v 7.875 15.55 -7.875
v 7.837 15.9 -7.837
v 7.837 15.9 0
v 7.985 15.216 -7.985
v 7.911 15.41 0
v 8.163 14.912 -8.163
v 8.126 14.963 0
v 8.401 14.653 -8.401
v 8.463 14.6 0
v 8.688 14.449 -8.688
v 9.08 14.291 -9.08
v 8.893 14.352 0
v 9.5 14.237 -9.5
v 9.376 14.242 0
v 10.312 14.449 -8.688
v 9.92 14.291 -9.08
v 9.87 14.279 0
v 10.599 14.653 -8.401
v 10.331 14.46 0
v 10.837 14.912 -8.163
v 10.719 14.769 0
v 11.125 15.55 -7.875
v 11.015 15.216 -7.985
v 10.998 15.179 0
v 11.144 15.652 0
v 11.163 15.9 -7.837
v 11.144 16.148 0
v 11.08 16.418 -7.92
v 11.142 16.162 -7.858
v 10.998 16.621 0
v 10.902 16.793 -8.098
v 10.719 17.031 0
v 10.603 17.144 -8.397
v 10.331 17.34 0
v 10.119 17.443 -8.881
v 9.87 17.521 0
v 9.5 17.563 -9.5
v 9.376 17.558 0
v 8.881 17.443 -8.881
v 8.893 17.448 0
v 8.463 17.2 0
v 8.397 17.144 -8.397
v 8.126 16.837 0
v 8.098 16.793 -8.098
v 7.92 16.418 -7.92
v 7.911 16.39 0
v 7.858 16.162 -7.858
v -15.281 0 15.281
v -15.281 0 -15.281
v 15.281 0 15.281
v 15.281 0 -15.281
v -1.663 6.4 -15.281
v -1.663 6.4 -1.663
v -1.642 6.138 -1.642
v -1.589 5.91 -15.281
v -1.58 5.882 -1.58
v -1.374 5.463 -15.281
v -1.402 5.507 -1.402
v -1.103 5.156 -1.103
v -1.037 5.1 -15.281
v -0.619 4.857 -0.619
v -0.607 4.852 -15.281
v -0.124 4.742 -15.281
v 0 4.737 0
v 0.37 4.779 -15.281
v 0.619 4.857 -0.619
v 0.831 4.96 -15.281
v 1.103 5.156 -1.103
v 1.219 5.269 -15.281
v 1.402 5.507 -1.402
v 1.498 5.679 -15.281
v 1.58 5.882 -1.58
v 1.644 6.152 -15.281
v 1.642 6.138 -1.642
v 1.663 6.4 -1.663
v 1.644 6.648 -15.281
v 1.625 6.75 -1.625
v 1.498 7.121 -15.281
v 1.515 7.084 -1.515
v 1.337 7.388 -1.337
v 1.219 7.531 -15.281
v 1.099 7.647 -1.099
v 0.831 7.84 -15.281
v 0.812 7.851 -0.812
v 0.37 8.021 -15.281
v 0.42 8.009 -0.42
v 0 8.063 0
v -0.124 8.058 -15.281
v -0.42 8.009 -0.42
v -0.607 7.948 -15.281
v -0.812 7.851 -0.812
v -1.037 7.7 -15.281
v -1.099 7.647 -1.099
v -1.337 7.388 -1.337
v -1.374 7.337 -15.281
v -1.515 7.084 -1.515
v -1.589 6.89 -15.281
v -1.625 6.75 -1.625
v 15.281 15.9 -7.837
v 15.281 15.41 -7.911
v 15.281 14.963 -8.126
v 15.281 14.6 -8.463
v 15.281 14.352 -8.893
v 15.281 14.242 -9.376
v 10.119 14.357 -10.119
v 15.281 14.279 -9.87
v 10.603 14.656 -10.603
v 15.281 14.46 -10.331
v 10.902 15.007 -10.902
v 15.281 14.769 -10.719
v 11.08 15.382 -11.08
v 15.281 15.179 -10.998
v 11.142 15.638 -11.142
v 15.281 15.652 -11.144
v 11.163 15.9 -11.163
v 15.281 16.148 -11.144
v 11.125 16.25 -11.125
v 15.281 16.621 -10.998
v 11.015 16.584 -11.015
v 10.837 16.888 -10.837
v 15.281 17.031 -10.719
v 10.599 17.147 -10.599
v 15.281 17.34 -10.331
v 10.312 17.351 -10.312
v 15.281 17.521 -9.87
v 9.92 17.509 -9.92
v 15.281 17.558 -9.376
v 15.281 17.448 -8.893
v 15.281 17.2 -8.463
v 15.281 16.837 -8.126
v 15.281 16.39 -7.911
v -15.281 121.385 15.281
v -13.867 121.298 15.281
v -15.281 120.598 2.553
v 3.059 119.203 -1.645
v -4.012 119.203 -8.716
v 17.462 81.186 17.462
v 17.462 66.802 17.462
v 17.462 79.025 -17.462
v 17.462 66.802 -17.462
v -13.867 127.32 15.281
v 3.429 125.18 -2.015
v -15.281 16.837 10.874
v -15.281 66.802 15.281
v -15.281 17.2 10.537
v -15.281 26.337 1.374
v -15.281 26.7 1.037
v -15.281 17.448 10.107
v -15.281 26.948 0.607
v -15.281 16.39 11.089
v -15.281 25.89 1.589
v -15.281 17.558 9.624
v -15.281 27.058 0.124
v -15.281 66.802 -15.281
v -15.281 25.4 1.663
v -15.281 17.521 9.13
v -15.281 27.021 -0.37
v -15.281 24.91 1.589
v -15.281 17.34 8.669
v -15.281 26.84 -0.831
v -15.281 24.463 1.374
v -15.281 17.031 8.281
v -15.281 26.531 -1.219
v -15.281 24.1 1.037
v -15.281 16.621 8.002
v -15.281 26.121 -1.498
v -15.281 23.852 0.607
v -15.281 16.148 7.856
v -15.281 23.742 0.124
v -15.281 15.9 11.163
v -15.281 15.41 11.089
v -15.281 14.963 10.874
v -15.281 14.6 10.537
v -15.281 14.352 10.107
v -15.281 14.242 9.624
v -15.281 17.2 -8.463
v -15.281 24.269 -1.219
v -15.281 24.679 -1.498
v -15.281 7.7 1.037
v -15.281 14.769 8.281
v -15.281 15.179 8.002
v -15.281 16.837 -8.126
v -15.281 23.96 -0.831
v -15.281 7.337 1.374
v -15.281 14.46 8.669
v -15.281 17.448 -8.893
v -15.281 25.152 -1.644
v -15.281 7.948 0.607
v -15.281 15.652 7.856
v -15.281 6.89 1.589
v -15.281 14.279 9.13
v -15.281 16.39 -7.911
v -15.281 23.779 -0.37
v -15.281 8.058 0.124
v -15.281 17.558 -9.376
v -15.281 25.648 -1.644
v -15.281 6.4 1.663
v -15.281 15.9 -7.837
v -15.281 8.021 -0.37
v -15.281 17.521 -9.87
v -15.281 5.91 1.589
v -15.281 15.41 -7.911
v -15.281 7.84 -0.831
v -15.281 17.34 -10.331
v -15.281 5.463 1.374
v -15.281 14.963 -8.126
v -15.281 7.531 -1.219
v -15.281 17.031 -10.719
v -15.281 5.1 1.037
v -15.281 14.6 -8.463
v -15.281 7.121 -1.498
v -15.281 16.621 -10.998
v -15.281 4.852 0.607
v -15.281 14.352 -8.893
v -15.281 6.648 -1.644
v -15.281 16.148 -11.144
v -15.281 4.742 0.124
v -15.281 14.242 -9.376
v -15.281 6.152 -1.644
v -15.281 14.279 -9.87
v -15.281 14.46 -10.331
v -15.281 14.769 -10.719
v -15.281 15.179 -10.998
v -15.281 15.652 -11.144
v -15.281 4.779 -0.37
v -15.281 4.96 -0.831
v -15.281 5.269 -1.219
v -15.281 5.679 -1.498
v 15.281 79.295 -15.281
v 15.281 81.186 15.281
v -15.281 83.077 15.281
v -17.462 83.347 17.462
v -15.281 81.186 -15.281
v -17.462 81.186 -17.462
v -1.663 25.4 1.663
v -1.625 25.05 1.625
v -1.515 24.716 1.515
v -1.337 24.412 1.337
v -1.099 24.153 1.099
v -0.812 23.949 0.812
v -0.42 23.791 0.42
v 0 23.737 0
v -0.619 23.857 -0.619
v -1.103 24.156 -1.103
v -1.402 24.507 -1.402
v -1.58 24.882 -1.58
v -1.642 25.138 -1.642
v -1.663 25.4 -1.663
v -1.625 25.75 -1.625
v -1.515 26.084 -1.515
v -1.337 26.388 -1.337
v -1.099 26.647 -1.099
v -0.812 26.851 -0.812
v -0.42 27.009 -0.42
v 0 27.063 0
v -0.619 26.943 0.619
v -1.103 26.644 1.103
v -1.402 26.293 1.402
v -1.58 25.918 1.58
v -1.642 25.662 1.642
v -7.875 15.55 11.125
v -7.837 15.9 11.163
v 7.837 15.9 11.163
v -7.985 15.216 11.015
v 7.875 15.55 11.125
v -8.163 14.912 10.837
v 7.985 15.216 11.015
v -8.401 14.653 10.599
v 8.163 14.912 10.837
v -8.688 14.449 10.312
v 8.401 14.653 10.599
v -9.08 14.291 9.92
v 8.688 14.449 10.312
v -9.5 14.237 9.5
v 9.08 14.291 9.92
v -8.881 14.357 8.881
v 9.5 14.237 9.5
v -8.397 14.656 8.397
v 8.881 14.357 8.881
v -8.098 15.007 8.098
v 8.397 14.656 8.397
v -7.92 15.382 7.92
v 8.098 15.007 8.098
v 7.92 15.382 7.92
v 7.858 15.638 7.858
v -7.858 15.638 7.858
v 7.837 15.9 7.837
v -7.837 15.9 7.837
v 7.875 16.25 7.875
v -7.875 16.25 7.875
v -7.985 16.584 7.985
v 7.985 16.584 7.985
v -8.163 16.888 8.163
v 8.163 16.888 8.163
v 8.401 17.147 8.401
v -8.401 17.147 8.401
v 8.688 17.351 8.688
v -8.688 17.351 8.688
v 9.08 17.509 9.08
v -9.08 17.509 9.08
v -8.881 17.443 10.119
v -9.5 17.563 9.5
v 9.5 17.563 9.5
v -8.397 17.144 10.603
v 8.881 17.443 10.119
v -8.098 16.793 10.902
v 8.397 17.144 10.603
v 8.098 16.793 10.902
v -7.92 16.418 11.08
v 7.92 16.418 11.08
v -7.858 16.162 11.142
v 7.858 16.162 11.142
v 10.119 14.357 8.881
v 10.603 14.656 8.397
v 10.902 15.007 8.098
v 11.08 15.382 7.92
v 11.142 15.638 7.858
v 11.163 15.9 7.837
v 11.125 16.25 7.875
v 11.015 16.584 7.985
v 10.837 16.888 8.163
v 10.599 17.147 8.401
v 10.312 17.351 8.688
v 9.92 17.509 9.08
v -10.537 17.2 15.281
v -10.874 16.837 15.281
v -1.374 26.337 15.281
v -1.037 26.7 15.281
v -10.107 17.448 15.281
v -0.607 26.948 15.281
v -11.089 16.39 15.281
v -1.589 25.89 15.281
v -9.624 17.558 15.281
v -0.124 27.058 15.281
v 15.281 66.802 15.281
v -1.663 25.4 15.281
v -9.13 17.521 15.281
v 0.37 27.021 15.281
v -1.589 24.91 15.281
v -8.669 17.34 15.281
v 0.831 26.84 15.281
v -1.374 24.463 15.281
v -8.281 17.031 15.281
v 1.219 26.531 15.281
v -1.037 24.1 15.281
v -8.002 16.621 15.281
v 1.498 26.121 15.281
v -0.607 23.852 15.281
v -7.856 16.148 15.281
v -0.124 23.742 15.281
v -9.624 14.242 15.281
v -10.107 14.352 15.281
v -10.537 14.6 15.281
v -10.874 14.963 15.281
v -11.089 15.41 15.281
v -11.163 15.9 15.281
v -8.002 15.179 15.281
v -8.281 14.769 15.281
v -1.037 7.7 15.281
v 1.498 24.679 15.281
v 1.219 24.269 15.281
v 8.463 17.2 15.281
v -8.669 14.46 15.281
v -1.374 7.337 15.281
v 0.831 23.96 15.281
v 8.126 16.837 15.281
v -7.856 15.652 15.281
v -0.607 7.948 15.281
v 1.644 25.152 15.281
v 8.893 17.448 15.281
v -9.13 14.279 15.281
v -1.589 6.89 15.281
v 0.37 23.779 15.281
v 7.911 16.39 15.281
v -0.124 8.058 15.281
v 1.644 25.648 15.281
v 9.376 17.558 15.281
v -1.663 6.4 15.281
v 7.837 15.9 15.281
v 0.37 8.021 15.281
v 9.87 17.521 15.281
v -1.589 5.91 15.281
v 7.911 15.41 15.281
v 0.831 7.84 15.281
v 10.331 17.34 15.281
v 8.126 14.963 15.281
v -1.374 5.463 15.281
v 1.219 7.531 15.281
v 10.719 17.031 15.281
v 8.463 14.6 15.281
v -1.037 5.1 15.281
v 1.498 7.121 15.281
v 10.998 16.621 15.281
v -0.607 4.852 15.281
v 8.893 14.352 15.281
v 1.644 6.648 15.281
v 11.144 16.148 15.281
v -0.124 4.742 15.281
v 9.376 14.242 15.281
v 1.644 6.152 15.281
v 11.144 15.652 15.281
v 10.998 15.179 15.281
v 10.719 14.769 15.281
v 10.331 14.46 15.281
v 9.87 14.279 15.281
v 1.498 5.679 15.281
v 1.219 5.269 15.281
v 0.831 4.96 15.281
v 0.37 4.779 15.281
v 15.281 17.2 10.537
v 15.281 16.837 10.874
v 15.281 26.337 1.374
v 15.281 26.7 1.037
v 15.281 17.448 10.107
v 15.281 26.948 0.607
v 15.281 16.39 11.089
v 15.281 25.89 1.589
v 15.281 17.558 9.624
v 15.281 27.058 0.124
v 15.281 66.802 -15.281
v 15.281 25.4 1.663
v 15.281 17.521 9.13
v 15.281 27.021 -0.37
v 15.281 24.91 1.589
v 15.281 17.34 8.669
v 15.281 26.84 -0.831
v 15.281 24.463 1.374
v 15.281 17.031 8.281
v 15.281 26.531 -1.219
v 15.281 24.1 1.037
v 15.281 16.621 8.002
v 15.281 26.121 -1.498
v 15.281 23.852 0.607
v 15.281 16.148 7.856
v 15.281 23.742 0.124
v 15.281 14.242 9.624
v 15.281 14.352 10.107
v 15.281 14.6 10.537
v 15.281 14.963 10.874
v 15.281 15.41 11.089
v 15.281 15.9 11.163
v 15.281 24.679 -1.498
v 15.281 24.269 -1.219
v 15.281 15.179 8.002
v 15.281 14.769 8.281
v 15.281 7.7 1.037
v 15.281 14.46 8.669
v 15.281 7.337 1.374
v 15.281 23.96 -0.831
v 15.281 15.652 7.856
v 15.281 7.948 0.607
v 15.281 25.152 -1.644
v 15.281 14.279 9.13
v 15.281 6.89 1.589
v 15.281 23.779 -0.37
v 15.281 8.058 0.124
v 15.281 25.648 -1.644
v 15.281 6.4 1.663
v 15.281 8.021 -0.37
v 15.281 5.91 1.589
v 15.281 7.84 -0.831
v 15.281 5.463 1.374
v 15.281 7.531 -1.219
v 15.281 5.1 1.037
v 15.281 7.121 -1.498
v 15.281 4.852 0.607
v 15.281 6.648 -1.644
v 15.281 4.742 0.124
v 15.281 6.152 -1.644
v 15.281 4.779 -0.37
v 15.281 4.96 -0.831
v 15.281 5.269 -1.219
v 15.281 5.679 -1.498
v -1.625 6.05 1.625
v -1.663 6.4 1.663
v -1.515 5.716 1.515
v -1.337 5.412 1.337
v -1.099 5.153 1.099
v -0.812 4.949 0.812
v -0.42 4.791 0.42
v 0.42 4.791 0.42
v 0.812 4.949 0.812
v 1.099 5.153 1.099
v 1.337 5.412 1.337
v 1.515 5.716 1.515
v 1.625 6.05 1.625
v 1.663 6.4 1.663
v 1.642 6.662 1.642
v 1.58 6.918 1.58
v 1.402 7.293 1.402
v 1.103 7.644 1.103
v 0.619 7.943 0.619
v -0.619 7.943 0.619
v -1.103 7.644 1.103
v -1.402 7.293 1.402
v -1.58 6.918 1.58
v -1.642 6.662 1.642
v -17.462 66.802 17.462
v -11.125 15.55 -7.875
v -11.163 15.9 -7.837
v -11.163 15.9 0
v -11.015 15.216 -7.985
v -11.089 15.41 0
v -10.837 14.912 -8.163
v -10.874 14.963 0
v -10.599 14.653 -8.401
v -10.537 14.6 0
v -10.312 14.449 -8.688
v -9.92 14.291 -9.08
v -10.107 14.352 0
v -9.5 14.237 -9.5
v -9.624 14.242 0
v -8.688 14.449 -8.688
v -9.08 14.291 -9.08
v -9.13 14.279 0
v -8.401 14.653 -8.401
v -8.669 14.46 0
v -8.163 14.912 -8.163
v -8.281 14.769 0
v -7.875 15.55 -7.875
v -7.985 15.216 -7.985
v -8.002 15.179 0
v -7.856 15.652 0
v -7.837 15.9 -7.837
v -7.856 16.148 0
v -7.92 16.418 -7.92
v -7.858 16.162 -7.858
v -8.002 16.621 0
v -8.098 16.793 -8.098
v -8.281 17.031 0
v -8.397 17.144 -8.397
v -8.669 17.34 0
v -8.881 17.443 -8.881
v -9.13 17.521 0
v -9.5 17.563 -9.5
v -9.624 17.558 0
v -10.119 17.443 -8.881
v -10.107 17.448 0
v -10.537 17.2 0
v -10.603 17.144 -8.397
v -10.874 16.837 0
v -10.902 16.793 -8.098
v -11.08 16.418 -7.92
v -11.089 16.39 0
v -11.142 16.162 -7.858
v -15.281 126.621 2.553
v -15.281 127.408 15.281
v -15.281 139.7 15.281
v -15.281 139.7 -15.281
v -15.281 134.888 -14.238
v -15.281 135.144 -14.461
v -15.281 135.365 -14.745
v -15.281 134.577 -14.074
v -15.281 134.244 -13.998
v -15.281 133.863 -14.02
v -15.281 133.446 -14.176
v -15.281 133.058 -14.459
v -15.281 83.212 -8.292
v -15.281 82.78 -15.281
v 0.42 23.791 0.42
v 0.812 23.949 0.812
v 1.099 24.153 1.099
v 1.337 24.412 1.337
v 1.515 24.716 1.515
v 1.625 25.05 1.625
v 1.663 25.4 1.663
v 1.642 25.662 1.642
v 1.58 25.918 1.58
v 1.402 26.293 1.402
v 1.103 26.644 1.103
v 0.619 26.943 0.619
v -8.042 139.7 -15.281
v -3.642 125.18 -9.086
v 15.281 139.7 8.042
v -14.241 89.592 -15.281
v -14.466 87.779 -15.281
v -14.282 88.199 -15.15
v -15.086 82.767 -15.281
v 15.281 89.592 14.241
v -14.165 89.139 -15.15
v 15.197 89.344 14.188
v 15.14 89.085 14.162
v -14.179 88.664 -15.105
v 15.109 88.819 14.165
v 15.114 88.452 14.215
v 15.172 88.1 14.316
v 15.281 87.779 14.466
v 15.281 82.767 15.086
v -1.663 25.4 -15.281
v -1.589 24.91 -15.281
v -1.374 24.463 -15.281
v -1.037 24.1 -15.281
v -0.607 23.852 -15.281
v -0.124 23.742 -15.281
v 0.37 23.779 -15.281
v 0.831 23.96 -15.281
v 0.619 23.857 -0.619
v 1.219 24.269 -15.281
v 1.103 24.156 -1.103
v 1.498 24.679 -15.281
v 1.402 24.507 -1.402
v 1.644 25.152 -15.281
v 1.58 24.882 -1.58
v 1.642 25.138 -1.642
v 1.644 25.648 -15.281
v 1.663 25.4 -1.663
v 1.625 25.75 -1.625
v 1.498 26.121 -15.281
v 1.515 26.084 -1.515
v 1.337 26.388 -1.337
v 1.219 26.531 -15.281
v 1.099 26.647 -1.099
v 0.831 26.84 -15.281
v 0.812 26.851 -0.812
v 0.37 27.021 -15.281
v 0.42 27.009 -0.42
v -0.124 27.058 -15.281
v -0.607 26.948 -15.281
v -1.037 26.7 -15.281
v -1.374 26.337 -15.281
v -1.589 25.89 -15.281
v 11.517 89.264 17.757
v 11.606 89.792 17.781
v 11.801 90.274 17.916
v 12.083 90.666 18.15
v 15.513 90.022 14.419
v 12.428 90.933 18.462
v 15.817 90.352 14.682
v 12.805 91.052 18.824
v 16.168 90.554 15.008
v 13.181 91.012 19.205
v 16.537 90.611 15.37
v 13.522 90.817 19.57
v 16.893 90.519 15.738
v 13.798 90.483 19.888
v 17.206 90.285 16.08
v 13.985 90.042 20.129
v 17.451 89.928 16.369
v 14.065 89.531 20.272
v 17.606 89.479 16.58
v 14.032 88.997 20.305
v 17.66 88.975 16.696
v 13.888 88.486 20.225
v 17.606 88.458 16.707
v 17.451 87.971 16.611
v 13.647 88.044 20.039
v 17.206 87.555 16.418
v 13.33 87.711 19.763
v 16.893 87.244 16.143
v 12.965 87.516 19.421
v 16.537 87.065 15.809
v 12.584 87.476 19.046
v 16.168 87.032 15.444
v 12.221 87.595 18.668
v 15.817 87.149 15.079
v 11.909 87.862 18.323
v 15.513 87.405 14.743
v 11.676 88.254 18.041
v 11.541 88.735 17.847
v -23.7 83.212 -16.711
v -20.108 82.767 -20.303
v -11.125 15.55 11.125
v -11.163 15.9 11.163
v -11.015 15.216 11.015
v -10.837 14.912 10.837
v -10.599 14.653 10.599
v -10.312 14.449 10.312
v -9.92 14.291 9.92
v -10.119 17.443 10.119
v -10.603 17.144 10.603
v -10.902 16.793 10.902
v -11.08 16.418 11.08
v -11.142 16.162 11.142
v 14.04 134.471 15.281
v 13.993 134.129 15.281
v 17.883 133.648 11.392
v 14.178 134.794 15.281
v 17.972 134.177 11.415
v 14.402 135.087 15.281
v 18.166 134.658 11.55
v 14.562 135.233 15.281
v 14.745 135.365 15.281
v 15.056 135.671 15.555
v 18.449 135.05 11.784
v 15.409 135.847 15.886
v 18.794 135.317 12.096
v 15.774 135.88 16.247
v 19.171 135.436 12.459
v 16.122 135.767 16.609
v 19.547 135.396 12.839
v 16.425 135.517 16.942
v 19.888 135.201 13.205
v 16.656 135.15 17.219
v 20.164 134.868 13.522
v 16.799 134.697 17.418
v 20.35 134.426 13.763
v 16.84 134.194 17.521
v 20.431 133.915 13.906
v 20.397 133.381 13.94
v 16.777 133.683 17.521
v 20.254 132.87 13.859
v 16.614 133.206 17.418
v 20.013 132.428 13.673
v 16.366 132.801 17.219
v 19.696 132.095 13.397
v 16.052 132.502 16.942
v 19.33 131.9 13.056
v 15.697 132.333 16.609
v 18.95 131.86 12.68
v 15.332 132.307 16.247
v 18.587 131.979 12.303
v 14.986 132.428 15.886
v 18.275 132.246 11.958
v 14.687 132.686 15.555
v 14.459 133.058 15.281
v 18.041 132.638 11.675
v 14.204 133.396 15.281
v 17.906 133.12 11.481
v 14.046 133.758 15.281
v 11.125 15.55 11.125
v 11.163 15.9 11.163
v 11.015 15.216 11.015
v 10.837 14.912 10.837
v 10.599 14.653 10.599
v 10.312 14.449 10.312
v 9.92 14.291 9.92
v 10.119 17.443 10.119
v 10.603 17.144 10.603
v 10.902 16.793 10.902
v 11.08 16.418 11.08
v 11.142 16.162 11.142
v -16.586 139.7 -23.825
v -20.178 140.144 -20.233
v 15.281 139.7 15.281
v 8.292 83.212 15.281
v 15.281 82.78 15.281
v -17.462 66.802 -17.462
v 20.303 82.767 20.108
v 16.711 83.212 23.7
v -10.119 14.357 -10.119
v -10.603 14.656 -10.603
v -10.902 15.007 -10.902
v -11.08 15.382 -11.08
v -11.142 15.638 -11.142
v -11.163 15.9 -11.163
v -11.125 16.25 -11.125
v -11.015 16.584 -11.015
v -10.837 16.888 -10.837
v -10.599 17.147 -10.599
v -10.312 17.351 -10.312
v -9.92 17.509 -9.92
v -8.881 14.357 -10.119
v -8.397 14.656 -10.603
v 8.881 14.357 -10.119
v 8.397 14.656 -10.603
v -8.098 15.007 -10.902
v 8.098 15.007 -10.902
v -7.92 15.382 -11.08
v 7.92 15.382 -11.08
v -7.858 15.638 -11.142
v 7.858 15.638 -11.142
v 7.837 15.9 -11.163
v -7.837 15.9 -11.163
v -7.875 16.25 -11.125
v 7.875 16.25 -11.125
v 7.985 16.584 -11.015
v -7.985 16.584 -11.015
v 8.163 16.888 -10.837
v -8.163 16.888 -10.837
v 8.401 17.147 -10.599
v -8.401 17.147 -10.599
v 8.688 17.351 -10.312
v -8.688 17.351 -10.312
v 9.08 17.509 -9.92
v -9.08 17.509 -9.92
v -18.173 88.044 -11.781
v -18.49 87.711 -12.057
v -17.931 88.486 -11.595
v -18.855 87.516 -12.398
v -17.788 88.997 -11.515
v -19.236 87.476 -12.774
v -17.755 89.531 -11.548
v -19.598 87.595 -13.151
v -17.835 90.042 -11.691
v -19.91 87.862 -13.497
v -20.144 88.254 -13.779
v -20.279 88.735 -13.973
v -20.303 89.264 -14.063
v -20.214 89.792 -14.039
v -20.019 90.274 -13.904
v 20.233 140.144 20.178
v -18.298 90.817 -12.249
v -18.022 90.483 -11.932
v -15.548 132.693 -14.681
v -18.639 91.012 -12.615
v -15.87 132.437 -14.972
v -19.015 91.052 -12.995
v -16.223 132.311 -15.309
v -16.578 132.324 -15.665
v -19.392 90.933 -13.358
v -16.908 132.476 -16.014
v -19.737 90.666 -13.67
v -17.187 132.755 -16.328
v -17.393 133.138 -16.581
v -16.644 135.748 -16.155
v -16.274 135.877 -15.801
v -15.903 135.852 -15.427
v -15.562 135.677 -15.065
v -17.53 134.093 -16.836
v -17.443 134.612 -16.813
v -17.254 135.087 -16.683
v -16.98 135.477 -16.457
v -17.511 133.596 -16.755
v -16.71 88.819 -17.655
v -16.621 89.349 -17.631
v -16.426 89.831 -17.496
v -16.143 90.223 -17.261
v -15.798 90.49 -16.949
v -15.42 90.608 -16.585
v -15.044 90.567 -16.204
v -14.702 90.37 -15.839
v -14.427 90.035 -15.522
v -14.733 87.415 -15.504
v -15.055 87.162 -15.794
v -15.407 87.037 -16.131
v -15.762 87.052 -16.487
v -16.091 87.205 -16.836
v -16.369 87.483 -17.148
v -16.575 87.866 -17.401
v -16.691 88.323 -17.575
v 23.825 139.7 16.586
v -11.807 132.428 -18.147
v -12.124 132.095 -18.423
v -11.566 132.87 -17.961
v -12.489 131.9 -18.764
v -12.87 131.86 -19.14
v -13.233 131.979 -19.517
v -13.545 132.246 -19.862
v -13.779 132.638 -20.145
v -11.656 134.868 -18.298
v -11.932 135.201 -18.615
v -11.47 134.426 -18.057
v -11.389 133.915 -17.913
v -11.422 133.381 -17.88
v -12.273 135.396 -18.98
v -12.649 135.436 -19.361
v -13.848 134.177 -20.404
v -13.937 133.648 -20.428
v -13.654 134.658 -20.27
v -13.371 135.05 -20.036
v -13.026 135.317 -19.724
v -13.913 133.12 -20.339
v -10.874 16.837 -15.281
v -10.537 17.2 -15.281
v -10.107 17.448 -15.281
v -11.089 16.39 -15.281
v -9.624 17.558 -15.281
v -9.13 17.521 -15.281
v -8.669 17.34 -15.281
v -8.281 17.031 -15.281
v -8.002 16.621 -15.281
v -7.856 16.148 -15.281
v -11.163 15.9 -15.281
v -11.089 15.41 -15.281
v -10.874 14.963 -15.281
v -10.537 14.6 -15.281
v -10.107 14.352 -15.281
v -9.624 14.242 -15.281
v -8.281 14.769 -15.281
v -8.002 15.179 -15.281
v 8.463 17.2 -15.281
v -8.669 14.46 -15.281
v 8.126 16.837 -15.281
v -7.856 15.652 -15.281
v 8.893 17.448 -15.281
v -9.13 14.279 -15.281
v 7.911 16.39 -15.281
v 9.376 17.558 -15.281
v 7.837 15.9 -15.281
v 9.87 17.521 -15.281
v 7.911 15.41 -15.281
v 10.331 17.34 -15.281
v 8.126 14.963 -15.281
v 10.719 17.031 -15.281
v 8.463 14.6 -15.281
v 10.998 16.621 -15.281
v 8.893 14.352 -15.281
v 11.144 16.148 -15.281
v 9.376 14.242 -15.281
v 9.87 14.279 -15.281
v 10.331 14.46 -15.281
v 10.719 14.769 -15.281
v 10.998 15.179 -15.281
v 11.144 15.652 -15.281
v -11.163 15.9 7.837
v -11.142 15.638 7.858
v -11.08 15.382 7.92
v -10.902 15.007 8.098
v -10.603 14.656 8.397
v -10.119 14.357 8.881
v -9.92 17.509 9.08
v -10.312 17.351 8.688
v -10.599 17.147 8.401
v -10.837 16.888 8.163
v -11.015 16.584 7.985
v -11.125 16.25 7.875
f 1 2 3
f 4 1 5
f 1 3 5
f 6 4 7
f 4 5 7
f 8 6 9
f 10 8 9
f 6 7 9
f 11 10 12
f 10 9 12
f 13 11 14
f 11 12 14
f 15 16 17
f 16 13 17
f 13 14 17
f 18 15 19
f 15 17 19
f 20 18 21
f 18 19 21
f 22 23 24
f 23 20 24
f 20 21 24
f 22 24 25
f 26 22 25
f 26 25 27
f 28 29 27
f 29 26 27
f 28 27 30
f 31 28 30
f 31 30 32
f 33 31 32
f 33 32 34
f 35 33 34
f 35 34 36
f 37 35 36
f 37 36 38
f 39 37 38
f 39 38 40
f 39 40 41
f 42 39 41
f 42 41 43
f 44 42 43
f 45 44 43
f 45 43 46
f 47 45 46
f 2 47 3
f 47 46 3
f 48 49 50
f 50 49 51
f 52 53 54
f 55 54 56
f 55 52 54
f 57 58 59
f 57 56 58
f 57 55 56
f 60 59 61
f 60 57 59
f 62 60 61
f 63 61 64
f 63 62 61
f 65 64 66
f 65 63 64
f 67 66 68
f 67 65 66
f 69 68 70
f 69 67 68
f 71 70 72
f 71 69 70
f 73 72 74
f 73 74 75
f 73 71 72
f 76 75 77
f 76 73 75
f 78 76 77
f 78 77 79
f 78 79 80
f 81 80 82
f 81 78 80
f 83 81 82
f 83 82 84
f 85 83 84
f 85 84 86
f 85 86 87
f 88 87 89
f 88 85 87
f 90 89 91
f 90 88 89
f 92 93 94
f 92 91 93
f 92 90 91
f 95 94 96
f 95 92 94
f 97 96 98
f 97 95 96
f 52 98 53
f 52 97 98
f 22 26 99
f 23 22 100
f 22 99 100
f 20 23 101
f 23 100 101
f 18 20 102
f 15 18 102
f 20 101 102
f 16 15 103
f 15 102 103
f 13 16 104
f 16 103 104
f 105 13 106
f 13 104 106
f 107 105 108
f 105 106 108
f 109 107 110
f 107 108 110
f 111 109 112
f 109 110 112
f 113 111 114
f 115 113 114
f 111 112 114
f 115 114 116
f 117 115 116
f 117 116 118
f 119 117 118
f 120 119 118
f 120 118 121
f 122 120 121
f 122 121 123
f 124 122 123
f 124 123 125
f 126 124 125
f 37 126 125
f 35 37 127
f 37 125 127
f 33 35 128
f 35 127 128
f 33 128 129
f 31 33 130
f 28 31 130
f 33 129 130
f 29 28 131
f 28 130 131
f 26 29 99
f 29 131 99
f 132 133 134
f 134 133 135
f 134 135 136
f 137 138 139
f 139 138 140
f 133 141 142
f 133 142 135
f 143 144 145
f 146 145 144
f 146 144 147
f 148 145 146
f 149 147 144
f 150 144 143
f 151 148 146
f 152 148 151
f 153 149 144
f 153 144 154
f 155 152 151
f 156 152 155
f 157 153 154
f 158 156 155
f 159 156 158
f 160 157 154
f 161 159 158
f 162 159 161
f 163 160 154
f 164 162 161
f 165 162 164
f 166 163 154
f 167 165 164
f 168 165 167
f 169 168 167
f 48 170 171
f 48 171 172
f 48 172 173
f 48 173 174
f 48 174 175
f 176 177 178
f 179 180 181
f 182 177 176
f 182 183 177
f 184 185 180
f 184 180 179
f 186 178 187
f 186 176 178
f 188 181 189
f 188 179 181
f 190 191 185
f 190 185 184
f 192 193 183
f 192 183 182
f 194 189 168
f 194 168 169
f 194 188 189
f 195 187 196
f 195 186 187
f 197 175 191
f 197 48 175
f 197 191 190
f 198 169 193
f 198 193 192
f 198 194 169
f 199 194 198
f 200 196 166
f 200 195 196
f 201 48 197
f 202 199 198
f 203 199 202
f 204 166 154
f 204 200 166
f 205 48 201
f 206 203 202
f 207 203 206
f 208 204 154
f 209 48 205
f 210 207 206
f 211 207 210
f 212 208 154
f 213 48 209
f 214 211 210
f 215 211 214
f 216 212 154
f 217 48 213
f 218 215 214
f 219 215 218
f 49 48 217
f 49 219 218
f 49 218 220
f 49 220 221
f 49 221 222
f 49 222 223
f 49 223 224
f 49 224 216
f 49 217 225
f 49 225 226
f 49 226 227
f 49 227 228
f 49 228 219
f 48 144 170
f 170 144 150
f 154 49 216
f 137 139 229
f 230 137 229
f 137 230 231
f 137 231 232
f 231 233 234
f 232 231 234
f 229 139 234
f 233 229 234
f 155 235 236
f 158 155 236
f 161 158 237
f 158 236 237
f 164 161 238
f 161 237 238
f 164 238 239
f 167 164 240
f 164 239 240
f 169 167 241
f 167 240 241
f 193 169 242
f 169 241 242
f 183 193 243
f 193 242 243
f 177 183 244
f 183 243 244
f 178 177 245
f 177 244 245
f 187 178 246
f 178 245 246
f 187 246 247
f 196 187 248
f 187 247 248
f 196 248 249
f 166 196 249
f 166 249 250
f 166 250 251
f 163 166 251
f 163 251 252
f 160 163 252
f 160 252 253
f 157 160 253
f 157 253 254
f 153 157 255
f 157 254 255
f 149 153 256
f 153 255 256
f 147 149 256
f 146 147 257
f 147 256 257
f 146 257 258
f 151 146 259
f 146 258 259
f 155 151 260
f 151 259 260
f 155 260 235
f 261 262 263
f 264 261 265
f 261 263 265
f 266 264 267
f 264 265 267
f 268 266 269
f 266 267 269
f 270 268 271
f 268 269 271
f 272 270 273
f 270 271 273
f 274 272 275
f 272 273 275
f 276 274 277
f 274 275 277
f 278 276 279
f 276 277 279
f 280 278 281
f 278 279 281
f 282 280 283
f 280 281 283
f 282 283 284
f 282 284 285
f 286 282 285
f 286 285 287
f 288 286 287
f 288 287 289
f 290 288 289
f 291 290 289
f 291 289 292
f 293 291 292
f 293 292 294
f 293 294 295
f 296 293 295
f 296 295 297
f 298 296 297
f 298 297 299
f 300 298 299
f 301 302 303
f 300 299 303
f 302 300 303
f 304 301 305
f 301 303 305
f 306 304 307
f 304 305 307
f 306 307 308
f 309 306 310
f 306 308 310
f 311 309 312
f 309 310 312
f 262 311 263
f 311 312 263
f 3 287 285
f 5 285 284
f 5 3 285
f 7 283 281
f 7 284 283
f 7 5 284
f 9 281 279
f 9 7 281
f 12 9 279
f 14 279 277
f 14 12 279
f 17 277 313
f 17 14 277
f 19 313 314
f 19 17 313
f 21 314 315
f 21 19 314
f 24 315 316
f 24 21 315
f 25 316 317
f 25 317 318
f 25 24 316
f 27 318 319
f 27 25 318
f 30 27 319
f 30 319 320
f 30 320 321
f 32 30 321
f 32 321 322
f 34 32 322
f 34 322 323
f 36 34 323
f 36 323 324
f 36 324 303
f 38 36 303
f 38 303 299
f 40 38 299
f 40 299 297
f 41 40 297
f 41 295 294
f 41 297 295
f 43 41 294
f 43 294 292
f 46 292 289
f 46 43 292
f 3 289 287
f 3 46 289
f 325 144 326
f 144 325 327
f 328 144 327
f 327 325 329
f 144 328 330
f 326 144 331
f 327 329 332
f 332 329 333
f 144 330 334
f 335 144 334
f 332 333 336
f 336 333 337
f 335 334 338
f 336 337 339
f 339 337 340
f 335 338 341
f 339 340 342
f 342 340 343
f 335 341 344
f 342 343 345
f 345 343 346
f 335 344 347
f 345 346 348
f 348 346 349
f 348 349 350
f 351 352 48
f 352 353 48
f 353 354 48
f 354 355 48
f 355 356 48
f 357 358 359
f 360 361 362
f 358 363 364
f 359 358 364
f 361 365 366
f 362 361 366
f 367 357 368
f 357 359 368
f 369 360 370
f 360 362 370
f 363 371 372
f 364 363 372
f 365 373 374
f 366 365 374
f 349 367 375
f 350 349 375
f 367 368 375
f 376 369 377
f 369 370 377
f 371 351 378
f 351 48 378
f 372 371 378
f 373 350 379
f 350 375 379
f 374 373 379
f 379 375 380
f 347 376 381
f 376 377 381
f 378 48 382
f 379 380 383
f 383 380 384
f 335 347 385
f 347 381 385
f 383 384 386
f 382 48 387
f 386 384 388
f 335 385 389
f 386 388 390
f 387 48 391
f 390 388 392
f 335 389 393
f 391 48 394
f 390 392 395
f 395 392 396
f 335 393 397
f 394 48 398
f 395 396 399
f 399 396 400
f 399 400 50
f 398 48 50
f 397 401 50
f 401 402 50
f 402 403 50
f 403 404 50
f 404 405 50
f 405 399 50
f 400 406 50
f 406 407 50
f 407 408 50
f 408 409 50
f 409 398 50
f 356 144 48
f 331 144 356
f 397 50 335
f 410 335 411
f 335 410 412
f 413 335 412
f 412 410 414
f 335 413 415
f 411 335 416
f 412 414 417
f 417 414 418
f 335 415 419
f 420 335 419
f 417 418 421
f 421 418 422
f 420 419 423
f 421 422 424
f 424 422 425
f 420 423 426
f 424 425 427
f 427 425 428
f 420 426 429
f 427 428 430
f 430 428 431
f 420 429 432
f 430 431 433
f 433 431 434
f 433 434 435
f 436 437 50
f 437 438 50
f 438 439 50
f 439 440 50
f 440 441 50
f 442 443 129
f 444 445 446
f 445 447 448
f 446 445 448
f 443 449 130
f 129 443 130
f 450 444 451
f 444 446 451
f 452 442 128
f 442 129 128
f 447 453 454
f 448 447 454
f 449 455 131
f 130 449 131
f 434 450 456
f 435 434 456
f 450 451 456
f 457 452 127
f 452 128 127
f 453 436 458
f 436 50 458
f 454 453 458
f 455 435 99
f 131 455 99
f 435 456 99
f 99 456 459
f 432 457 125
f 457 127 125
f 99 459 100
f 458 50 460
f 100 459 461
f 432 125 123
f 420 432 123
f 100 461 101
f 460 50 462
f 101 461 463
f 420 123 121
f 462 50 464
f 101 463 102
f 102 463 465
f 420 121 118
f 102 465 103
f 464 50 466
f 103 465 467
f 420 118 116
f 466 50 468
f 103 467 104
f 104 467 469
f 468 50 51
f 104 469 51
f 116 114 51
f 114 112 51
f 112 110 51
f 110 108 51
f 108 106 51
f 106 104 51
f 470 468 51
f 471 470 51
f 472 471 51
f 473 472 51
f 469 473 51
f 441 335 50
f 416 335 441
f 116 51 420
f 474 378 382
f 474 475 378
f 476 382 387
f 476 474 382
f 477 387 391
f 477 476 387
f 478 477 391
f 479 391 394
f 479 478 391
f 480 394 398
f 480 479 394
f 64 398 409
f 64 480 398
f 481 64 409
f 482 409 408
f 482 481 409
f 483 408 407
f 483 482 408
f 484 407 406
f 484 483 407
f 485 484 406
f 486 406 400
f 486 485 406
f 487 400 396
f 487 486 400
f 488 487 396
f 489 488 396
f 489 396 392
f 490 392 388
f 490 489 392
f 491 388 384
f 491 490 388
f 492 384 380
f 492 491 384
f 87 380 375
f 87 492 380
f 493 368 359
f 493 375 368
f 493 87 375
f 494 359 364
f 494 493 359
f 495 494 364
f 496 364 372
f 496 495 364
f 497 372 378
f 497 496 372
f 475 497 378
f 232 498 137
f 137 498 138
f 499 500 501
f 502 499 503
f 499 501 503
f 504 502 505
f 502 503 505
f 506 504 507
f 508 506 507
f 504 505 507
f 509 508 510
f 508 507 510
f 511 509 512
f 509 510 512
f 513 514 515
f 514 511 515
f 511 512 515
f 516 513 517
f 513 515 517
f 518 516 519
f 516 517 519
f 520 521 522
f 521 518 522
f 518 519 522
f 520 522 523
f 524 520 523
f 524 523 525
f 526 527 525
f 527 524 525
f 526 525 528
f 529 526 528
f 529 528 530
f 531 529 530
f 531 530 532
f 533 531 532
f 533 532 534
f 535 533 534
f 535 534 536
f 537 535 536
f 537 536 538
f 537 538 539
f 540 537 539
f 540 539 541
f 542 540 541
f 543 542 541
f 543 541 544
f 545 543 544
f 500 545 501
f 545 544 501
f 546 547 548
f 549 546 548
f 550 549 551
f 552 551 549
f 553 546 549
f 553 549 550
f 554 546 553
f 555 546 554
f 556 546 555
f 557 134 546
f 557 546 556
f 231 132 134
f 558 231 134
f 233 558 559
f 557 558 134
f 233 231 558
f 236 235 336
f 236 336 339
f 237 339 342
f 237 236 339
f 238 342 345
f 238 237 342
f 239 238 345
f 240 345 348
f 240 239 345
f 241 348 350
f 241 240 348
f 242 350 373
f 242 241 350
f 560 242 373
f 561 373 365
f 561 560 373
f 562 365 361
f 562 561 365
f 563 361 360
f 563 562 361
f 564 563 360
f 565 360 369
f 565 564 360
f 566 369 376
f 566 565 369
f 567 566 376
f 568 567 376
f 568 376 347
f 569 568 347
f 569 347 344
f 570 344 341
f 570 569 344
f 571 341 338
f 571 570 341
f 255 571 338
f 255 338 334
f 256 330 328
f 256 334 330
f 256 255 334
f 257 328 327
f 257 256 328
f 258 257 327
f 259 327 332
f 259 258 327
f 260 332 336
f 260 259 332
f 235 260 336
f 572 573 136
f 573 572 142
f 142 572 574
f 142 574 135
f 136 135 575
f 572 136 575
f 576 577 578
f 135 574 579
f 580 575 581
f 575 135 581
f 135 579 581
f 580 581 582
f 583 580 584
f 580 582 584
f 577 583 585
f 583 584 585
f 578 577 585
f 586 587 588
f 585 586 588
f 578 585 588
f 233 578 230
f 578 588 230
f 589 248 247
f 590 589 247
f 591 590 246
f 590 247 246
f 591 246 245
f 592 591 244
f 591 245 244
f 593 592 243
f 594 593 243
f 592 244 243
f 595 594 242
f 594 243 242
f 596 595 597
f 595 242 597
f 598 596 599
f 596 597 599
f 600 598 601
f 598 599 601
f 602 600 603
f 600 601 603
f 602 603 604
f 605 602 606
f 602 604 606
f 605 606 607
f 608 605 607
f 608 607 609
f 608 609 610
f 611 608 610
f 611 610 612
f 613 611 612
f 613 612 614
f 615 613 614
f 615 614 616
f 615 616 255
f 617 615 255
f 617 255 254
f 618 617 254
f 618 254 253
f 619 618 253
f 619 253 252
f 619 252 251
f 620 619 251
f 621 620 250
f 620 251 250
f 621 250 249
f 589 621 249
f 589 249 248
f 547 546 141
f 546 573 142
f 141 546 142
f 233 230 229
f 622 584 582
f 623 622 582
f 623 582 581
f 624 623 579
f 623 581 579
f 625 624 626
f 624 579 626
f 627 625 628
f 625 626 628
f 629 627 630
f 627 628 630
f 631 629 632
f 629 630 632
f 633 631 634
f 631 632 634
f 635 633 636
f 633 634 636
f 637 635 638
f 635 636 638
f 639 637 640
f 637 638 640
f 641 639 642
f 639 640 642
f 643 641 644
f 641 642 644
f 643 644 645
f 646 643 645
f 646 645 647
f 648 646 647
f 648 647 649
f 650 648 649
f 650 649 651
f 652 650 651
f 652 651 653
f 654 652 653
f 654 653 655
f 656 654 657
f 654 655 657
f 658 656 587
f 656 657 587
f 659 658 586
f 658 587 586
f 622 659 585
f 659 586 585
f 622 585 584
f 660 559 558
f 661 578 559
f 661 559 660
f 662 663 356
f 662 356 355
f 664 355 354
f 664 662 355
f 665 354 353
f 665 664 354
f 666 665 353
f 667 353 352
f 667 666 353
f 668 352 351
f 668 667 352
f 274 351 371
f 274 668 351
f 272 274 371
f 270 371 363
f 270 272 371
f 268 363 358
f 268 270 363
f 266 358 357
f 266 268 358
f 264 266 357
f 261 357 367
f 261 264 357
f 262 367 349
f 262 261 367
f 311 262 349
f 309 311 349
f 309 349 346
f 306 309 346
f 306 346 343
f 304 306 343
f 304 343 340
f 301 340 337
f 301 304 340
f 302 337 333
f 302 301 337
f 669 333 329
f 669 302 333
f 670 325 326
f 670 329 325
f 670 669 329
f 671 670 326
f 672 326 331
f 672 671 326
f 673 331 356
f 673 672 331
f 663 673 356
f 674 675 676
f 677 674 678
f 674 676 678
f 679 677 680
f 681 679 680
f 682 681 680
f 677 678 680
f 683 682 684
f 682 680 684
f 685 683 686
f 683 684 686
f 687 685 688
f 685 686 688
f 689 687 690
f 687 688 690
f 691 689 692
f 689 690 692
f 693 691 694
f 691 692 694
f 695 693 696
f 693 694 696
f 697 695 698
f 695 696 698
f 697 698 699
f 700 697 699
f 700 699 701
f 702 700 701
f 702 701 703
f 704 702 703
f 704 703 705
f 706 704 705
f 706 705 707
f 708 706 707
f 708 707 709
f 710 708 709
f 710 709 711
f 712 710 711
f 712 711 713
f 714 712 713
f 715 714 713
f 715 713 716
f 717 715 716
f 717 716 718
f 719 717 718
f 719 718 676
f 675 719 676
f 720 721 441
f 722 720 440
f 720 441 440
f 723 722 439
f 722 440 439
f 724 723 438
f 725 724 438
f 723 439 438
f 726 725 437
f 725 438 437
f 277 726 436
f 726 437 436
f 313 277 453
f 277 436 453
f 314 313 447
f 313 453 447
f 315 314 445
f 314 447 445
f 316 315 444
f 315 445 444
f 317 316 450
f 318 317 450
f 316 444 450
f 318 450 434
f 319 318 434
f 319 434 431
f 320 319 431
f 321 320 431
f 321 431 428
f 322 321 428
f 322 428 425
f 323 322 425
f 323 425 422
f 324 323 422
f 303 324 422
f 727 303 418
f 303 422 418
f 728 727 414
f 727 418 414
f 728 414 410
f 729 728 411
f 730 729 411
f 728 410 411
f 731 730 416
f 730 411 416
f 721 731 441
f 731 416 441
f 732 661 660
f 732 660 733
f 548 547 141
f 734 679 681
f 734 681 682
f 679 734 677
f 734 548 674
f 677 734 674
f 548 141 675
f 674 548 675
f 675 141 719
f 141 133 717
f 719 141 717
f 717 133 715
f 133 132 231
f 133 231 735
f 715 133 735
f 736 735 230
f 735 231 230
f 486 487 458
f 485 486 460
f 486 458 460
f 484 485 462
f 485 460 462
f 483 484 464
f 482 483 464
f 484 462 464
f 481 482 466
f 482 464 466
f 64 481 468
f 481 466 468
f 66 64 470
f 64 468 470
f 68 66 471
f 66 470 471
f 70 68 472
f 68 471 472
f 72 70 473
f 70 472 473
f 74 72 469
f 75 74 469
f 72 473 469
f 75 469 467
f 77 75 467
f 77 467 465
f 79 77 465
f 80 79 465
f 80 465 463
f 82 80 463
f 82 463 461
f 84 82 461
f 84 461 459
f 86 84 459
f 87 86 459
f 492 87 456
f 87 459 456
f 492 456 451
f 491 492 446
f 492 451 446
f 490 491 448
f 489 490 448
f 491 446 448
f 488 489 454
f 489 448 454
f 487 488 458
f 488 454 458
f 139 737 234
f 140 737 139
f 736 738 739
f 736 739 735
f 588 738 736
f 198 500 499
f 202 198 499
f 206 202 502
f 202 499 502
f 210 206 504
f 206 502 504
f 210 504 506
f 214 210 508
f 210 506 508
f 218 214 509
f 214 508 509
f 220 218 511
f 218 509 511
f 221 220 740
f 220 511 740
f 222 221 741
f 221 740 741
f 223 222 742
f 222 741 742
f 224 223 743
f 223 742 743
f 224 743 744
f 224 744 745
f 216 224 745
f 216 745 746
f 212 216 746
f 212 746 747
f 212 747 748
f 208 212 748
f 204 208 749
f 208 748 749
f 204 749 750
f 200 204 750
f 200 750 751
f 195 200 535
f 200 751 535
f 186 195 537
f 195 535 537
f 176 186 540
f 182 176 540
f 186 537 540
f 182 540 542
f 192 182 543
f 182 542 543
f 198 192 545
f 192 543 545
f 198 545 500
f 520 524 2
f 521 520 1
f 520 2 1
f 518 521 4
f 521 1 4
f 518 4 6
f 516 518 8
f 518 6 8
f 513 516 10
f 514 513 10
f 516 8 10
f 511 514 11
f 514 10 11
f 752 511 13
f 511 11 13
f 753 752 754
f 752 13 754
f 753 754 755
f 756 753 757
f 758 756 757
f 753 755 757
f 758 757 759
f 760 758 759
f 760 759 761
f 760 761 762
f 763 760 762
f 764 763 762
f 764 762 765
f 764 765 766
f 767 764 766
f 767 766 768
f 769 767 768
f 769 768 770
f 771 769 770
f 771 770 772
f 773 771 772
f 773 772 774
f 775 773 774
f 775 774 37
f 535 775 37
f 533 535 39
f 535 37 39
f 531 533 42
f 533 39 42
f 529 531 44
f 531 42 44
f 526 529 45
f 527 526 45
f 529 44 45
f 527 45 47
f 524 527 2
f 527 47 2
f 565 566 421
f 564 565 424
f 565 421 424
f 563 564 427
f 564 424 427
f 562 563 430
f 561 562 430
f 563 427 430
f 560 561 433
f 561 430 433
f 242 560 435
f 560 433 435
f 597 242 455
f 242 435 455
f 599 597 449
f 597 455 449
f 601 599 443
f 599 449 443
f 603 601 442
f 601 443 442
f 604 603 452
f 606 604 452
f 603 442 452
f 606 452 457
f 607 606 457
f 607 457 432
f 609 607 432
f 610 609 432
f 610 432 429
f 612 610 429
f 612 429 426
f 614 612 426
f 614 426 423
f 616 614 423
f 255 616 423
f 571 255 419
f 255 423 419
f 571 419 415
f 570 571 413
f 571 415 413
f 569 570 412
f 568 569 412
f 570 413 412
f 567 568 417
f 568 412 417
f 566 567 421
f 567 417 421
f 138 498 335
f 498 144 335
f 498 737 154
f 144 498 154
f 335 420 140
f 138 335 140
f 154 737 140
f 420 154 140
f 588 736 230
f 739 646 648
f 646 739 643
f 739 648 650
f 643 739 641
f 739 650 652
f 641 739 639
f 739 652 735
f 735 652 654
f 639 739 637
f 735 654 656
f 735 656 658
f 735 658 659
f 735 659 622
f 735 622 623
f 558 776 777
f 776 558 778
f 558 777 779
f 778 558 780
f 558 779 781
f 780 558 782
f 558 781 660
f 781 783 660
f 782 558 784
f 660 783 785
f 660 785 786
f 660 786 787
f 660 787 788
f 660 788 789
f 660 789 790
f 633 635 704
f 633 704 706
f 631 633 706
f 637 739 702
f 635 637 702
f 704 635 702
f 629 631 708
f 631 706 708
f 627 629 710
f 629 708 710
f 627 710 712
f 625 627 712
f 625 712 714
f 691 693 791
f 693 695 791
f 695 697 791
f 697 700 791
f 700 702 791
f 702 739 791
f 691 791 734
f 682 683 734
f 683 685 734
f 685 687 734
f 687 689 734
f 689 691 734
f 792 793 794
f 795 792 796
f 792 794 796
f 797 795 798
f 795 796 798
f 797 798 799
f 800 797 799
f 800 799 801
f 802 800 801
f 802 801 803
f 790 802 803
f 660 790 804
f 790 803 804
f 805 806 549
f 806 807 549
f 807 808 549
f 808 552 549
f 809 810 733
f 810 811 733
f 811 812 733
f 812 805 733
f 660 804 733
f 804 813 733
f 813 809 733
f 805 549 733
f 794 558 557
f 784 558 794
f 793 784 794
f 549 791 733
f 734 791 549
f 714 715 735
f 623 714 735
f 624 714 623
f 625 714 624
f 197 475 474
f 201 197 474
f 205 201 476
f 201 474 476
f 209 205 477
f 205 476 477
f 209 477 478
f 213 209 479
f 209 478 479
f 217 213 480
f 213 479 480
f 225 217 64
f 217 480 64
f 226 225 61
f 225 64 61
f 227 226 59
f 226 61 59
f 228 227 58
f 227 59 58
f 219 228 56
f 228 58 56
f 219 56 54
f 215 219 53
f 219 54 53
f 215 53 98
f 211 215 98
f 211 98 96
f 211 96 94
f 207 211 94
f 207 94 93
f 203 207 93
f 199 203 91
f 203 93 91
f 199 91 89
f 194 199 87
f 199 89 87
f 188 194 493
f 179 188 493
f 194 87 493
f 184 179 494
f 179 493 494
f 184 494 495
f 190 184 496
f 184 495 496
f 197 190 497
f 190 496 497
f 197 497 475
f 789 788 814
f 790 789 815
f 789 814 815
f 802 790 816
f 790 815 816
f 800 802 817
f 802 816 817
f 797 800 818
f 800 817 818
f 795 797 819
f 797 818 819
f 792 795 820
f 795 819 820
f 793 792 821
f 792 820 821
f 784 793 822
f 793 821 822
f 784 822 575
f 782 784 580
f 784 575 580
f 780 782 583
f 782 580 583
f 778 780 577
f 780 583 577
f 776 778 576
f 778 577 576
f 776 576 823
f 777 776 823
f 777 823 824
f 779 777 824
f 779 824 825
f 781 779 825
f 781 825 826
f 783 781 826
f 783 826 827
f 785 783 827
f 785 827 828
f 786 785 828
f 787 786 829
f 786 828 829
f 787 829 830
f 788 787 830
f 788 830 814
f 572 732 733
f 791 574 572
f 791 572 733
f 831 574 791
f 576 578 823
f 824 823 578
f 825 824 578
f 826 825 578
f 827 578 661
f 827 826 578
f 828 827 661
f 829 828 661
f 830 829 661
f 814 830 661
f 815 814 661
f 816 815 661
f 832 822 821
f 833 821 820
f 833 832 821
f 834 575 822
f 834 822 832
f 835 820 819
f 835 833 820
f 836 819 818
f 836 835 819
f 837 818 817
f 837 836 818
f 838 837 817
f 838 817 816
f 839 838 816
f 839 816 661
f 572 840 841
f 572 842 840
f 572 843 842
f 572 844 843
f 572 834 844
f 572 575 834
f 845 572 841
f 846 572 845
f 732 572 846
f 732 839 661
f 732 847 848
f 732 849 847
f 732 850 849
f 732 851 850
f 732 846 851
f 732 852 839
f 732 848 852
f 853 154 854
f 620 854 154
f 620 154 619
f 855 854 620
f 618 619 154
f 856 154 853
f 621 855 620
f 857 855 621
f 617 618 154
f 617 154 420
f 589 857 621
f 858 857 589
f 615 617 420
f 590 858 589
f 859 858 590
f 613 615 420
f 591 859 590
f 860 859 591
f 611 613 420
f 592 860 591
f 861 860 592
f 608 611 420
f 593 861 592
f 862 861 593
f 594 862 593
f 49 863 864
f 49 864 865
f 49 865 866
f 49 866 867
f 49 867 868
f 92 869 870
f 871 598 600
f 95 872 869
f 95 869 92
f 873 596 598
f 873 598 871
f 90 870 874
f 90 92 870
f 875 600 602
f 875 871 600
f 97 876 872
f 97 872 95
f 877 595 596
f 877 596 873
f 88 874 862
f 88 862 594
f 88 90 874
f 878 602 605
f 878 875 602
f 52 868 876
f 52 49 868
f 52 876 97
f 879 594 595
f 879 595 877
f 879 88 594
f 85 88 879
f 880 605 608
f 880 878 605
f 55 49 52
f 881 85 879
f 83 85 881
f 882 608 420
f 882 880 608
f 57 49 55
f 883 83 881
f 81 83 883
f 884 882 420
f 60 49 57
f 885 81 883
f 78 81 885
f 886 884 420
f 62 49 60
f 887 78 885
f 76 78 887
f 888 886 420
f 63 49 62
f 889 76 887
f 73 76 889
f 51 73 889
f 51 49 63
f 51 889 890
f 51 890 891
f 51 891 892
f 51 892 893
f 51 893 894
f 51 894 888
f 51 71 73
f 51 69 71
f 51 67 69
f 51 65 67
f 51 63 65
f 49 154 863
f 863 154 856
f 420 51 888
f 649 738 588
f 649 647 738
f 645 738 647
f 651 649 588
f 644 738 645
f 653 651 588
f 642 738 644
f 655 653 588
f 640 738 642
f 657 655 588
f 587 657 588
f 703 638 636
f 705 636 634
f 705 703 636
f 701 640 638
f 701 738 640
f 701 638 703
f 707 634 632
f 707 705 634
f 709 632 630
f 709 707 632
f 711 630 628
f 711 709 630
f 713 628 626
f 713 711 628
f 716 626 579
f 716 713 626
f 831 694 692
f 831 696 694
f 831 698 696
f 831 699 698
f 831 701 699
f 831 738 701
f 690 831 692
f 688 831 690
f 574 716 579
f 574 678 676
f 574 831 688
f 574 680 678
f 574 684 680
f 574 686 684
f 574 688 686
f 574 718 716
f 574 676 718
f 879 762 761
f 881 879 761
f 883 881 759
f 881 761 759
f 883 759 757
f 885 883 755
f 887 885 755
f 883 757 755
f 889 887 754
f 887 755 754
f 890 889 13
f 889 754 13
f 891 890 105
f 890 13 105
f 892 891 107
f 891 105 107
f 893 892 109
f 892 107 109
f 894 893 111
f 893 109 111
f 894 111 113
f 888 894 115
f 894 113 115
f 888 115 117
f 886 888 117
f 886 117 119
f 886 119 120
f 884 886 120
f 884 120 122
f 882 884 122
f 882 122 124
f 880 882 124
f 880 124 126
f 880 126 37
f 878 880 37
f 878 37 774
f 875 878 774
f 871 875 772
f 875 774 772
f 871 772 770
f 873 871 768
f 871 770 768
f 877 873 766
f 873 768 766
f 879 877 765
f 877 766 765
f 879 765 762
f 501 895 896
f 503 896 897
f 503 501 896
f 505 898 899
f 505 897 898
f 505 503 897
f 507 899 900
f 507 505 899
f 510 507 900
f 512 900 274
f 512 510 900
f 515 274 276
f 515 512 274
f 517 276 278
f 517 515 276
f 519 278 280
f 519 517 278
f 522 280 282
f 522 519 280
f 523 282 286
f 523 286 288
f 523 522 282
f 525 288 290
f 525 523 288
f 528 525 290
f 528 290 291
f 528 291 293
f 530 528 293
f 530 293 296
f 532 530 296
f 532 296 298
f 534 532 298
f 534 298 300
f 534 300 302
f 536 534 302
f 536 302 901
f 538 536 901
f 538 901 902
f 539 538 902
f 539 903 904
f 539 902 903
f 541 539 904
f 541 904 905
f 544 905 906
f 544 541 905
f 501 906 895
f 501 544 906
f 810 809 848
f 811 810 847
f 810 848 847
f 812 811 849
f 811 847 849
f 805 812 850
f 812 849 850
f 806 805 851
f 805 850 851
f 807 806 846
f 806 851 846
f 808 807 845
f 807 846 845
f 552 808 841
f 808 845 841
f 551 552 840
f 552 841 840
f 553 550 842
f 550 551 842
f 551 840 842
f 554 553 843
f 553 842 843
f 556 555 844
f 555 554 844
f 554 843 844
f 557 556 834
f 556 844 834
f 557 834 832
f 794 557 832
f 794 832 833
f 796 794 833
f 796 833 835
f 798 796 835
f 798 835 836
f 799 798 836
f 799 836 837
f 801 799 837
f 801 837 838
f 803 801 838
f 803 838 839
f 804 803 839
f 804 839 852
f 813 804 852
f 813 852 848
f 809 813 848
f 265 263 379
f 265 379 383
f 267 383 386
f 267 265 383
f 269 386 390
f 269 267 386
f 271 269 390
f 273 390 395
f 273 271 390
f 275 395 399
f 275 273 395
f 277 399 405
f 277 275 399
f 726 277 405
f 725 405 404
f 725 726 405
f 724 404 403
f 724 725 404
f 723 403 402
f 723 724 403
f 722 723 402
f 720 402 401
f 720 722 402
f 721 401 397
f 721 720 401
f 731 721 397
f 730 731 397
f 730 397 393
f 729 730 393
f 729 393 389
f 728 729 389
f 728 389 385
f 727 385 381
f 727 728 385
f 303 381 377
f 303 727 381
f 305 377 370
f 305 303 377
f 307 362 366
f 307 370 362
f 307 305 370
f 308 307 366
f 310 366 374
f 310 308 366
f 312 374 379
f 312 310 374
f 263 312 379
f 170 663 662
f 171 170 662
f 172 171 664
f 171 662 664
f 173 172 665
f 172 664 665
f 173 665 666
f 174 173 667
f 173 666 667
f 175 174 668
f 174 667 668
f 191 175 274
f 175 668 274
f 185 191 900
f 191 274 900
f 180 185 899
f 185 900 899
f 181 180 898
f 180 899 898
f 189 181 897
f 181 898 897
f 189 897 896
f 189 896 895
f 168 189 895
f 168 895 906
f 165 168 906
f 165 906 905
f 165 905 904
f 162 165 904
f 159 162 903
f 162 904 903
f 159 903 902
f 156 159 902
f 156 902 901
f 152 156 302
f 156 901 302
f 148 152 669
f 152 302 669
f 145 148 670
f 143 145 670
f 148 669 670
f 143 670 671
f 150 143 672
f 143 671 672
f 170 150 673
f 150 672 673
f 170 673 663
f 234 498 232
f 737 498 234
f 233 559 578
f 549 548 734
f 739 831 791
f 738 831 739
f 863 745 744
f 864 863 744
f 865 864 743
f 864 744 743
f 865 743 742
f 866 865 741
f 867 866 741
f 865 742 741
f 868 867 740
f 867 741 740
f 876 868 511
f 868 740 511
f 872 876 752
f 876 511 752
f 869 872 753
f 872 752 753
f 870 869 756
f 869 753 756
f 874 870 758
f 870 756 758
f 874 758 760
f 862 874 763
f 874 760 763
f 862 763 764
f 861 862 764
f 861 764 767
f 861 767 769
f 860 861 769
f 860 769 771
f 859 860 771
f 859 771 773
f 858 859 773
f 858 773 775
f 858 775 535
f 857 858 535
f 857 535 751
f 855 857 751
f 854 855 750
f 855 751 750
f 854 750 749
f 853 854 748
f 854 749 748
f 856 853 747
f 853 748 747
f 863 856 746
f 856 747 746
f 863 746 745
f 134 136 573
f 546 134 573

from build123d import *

# Parameters (mm, degrees)
SKETCH1_W               = 30.562599784
SKETCH1_H               = 30.562599784
BOSS_EXTRUDE1_DEPTH     = 139.7
CUT_EXTRUDE1_DEPTH      = 142.361685943
CUT_EXTRUDE1_DEPTH_BACK = 142.361685943
BOSS_EXTRUDE2_DEPTH     = 5.09983
SKETCH5_R               = 1.8
CUT_EXTRUDE2_DEPTH      = 146.354775845
SKETCH6_R               = 1.662500104
CUT_EXTRUDE3_DEPTH      = 145.138064655
BOSS_EXTRUDE3_REACH     = 212.94
BOSS_EXTRUDE3_START     = 66.802
SKETCH8_W               = 34.925
SKETCH8_H               = 34.925
SKETCH8_W_2             = 30.562599784
SKETCH8_H_2             = 30.562599784


with BuildPart() as part:
    # Sketch1 → Boss-Extrude1 (new body)
    with BuildSketch(Plane(origin=(0, 0, 0), x_dir=(1, 0, 0), z_dir=(0, 1, 0))):
        Rectangle(SKETCH1_W, SKETCH1_H)
    extrude(amount=BOSS_EXTRUDE1_DEPTH)

    # Sketch2 → Cut-Extrude1 (cut, two sides: drawn at the far end of the back side and taken through both)
    with BuildSketch(Plane(origin=(0, 0, 0), x_dir=(0, -1, 0), z_dir=(-0.7071067811865438, 0, -0.7071067811865512)).offset(-CUT_EXTRUDE1_DEPTH_BACK)):
        Polygon((-139.7, -5.11931044), (-81.186013921, 0), (-79.295294527, -21.611021558), (-139.7, -21.611021558), align=None)
    extrude(amount=CUT_EXTRUDE1_DEPTH + CUT_EXTRUDE1_DEPTH_BACK, mode=Mode.SUBTRACT)

    # Sketch4 → Boss-Extrude2 (add)
    with BuildSketch(Plane(origin=(-4.984326181, 0.616698988, 4.984326181), x_dir=(-0.6990962056889038, 0.08640854919208918, -0.7097873328102555), z_dir=(0.7044160264027624, -0.08715574274765817, -0.704416026402755))):
        Polygon((40.57727892, 136.609827857), (-16.357328672, 141.566939751), (-21.314440566, 84.632332159), (35.620167026, 79.675220265), align=None)
    extrude(amount=-BOSS_EXTRUDE2_DEPTH)

    # Sketch5 → Cut-Extrude2 (cut, through all)
    with BuildSketch(Plane(origin=(-4.984326181, 0.616698988, 4.984326181), x_dir=(-0.6990962056889037, 0.0864085491920891, -0.7097873328102555), z_dir=(0.7044160264027625, -0.08715574274765821, -0.7044160264027549))):
        with Locations(Location((33.998237872, 131.084660992, 0), (0, 0, 355.023990467))):
            Circle(SKETCH5_R)
        with Locations(Location((-10.832161807, 134.987898703, 0), (0, 0, 355.023990467))):
            Circle(SKETCH5_R)
        with Locations(Location((-14.735399518, 90.157499024, 0), (0, 0, 355.023990467))):
            Circle(SKETCH5_R)
        with Locations(Location((30.095000161, 86.254261313, 0), (0, 0, 355.023990467))):
            Circle(SKETCH5_R)
        Polygon((19.811839734, 123.787667921), (9.849528694, 124.65505408), (9.329097, 118.677667456), (19.291408039, 117.810281298), align=None)
    extrude(amount=-CUT_EXTRUDE2_DEPTH, mode=Mode.SUBTRACT)

    # Sketch6 → Cut-Extrude3 (cut, symmetric)
    with BuildSketch(Plane(origin=(0, 0, 0), x_dir=(0, 0, -1), z_dir=(1, 0, 0))):
        with Locations(Location((0, 25.4, 0), (0, 0, 180))):
            Circle(SKETCH6_R)
        with Locations(Location((-9.5, 15.9, 0), (0, 0, 180))):
            Circle(SKETCH6_R)
        with Locations(Location((9.5, 15.9, 0), (0, 0, 180))):
            Circle(SKETCH6_R)
        with Locations(Location((0, 6.4, 0), (0, 0, 180))):
            Circle(SKETCH6_R)
    cut_extrude3 = extrude(amount=CUT_EXTRUDE3_DEPTH, both=True, mode=Mode.SUBTRACT)

    # Mirror1: Cut-Extrude3 across plane
    add(cut_extrude3.mirror(Plane(origin=(0, 0, 0), x_dir=(-0.7071067811865512, 0, 0.7071067811865439), z_dir=(-0.7071067811865438, 0, -0.7071067811865512))), mode=Mode.SUBTRACT)

    # Boss-Extrude3: up to this plane
    boss_extrude3_end = Plane(origin=(15.281299892, 81.186013921, 15.281299892), z_dir=(-0.06162841671621989, -0.9961946980917455, 0.061628416716219235))
    # Sketch8 → Boss-Extrude3 (add, up to the surface)
    with BuildSketch(Plane(origin=(0, 0, 0), x_dir=(1, 0, 0), z_dir=(0, 1, 0)).offset(BOSS_EXTRUDE3_START), mode=Mode.PRIVATE) as boss_extrude3_sk1:
        Rectangle(SKETCH8_W, SKETCH8_H)
        Rectangle(SKETCH8_W_2, SKETCH8_H_2, mode=Mode.SUBTRACT)
    boss_extrude3_tool1 = split(extrude(boss_extrude3_sk1.sketch, amount=BOSS_EXTRUDE3_REACH, mode=Mode.PRIVATE), bisect_by=boss_extrude3_end, keep=Keep.BOTH, mode=Mode.PRIVATE)
    add(boss_extrude3_tool1.solids().sort_by_distance((0, 66.802, 16.968586))[0])


solid = part.part
